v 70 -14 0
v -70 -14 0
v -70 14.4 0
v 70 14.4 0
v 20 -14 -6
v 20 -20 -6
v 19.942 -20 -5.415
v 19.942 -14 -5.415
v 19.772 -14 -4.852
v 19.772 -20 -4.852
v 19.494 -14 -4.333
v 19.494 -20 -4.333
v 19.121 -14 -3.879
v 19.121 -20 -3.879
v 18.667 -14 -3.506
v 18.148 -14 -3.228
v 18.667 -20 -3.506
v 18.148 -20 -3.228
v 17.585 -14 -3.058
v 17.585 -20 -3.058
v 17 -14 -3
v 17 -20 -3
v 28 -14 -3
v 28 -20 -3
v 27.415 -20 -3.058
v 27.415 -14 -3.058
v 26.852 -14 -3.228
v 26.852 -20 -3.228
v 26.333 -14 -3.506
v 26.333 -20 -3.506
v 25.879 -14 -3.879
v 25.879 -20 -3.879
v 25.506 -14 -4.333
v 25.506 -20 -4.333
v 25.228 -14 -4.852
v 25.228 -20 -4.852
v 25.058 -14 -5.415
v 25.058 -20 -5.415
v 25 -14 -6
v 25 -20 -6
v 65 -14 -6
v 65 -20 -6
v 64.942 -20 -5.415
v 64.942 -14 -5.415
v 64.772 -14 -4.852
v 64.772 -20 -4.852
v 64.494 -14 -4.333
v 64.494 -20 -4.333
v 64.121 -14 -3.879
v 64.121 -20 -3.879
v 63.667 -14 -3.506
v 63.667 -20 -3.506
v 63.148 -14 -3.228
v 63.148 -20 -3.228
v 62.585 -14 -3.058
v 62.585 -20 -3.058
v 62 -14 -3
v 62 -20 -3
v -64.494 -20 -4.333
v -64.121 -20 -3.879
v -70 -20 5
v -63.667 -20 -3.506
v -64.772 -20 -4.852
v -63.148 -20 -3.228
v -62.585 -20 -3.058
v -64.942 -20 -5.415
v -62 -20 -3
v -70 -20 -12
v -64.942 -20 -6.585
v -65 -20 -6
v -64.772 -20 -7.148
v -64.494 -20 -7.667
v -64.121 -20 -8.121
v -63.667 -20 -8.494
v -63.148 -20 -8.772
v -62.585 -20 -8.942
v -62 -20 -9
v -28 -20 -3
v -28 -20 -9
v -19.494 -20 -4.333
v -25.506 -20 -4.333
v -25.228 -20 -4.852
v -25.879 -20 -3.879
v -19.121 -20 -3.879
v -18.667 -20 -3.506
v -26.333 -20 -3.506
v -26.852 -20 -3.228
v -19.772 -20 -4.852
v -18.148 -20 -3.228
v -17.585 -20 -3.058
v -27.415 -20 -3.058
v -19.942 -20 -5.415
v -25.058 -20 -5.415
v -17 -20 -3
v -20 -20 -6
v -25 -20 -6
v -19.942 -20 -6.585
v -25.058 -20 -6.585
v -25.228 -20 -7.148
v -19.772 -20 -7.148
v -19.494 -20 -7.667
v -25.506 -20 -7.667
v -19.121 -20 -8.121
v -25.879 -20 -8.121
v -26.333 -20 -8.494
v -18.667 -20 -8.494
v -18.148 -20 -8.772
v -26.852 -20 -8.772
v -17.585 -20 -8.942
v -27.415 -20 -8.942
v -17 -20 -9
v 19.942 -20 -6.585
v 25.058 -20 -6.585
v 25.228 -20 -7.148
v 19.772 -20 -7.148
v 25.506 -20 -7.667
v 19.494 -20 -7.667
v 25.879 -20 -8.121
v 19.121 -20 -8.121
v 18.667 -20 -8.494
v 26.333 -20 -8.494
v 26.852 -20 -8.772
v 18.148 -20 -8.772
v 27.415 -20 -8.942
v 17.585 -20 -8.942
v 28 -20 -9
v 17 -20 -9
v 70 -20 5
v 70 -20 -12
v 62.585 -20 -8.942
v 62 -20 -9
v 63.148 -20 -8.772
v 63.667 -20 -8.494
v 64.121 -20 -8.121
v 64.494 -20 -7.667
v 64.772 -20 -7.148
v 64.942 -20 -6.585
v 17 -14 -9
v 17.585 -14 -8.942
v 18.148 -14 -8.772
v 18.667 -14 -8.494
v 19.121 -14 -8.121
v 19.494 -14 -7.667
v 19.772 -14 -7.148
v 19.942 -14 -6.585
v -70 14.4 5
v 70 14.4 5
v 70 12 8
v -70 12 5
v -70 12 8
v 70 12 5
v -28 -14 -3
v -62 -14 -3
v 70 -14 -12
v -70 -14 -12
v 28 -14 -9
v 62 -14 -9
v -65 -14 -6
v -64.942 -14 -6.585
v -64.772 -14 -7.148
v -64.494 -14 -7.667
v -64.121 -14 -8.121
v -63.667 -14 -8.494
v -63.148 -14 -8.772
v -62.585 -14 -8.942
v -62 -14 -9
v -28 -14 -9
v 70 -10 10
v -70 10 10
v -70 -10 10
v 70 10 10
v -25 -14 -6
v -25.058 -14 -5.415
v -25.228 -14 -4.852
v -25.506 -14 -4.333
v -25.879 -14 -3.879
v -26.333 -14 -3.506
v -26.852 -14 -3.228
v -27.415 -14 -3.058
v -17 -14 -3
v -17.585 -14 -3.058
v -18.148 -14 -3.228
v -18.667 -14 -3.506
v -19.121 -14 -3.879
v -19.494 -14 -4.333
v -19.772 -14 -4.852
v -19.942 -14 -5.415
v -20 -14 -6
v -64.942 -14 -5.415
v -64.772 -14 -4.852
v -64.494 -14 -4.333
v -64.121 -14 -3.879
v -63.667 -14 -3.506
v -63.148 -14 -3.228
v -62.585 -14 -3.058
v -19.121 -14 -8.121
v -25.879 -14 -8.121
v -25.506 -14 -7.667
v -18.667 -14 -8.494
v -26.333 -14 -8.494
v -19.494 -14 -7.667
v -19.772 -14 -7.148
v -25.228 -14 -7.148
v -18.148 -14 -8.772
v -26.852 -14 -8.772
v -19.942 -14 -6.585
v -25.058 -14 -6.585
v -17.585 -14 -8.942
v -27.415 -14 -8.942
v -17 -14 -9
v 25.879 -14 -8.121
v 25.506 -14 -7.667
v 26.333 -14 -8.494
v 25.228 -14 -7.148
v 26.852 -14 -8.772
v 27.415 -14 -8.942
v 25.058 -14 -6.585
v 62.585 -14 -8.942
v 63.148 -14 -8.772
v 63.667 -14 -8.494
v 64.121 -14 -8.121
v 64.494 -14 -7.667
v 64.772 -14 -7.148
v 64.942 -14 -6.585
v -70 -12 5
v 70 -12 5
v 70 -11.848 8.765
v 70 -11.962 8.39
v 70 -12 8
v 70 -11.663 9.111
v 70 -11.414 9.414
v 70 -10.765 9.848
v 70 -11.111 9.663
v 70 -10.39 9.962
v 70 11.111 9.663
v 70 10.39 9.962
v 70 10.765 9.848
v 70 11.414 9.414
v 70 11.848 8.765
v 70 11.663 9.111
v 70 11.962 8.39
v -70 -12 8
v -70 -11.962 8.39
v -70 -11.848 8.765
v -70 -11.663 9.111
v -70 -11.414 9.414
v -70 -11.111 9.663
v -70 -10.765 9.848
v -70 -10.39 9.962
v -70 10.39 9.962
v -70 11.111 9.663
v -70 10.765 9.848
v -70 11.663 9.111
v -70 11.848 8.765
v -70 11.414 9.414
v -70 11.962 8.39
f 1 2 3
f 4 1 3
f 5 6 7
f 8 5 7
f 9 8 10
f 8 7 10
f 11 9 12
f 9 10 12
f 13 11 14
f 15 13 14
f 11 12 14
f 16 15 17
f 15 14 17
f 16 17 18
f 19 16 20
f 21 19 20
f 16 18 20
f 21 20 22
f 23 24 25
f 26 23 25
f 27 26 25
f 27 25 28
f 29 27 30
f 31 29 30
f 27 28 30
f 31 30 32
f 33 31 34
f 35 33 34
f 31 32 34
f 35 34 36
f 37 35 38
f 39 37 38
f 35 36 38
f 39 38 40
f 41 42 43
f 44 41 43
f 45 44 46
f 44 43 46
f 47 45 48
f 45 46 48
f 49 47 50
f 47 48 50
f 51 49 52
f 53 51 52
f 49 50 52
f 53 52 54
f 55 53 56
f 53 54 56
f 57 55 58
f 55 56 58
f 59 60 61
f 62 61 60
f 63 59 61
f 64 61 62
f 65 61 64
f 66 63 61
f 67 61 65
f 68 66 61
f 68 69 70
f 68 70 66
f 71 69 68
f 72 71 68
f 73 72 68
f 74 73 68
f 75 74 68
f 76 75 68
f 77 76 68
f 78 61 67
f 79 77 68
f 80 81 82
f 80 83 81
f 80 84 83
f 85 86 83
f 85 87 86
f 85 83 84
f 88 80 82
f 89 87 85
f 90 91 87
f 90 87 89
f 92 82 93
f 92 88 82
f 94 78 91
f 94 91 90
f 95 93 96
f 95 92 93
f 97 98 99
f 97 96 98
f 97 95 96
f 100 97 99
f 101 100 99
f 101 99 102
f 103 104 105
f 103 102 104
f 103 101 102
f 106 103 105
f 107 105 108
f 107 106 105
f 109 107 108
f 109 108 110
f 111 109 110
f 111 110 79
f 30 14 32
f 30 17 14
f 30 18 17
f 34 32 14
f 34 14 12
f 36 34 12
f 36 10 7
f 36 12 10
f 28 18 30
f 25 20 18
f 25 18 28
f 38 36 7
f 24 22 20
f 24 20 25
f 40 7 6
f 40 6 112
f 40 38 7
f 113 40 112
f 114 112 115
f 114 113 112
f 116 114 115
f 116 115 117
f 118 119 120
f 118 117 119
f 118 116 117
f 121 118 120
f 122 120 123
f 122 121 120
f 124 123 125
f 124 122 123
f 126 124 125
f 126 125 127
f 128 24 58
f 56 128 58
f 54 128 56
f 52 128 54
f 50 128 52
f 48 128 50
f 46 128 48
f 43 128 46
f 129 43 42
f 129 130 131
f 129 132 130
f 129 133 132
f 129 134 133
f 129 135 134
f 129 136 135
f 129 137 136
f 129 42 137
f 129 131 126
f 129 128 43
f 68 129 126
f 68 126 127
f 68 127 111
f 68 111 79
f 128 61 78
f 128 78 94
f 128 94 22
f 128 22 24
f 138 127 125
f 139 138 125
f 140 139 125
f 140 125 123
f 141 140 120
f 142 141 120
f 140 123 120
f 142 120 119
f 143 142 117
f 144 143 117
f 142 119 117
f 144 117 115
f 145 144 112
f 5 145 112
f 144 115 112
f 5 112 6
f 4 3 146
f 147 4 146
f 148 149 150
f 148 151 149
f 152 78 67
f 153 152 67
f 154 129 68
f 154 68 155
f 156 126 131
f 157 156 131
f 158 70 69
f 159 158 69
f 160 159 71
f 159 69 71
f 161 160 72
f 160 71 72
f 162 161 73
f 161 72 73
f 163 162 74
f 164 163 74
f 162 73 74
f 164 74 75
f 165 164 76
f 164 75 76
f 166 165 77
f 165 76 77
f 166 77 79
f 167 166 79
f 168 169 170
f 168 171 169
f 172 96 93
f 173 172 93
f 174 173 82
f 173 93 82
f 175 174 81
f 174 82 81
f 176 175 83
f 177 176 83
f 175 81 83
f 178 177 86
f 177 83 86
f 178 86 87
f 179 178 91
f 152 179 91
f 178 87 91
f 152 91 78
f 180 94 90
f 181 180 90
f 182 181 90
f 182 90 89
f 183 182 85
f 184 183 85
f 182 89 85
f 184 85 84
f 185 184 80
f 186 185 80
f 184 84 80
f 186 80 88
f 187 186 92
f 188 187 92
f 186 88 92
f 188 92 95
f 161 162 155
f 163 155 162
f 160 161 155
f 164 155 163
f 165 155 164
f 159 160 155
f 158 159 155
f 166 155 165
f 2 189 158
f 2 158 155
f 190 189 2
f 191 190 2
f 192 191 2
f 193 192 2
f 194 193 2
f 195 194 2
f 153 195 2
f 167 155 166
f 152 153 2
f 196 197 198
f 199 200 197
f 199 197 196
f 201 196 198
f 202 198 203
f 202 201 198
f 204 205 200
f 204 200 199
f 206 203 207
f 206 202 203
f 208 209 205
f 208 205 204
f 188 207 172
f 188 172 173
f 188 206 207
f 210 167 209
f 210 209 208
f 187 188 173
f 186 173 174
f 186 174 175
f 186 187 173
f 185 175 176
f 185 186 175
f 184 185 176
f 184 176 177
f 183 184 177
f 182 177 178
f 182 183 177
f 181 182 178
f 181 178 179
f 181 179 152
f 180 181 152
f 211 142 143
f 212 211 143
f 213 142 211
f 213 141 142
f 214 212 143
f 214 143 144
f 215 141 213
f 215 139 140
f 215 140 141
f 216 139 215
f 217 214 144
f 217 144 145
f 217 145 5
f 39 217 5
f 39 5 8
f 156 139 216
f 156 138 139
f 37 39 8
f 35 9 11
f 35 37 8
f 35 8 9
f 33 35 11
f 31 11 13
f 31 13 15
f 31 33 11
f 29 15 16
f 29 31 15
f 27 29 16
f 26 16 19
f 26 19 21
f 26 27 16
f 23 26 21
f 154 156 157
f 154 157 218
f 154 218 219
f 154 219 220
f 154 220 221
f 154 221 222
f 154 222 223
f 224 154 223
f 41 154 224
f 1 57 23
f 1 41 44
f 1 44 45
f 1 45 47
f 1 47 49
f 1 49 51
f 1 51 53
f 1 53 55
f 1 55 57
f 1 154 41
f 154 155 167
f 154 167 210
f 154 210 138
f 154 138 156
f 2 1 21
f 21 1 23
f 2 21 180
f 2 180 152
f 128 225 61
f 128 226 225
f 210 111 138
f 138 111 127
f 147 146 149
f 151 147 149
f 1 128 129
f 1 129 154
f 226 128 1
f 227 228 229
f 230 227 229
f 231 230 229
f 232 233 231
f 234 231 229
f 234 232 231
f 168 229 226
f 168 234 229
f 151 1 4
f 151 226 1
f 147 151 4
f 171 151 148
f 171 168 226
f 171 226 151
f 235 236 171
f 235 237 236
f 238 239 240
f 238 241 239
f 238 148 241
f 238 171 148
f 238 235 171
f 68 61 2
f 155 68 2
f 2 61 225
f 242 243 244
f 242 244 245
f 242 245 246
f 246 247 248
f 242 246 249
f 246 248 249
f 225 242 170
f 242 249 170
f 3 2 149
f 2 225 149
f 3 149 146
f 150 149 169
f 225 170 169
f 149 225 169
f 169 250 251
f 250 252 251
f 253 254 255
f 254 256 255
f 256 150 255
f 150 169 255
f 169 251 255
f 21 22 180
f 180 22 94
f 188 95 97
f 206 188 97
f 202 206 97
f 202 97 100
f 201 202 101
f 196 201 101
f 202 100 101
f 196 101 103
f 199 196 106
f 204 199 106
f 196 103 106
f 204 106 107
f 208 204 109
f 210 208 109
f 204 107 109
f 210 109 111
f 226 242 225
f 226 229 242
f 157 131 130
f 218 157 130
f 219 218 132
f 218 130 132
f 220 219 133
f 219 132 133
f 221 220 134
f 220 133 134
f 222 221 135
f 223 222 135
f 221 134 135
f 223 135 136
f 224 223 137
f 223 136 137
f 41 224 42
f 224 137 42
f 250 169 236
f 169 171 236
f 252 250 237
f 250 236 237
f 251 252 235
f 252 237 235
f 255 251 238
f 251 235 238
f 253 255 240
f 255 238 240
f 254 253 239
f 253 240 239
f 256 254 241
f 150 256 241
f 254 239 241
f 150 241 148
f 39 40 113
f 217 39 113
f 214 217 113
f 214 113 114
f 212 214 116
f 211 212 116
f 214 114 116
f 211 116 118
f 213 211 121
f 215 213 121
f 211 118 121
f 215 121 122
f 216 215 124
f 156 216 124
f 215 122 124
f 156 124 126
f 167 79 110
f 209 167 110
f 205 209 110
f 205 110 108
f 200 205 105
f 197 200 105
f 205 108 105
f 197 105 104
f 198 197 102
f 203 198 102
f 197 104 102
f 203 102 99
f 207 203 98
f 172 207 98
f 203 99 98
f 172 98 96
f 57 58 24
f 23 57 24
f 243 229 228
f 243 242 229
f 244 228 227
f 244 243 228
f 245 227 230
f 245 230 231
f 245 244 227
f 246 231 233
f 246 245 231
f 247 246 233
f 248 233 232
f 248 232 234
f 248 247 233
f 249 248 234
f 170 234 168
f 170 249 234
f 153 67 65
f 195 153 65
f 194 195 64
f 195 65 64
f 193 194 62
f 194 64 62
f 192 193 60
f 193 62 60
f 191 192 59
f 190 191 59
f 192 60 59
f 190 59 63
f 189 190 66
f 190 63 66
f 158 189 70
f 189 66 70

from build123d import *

# Parameters (mm, degrees)
F1_DEPTH = 70
F2_R     = 2
F4_DEPTH = 25


with BuildPart() as f1:
    # F0 (on Right) → F1 (new body, symmetric)
    with BuildSketch(Plane.YZ):
        Polygon((-20, 5), (-20, -12), (-14, -12), (-14, 0), (14.4, 0), (14.4, 5), (12, 5), (12, 10), (-12, 10), (-12, 5), align=None)
    extrude(amount=F1_DEPTH, both=True)

    # F2
    f2_edges = [f1.edges().sort_by_distance(p)[0] for p in [
        (0, -12, 10),
        (0, 12, 10),
    ]]
    fillet(f2_edges, radius=F2_R)

    # F3 (on face) → F4 (cut)
    with BuildSketch(Plane.XZ.offset(20)):
        with BuildLine():
            Line((-28, -3), (-62, -3))
            ThreePointArc((-62, -3), (-64.12132, -3.87868), (-65, -6))
            ThreePointArc((-65, -6), (-64.12132, -8.12132), (-62, -9))
            Line((-62, -9), (-28, -9))
            ThreePointArc((-28, -9), (-25.87868, -8.12132), (-25, -6))
            ThreePointArc((-25, -6), (-25.87868, -3.87868), (-28, -3))
        make_face()
        with BuildLine():
            Line((17, -3), (-17, -3))
            ThreePointArc((-17, -3), (-19.12132, -3.87868), (-20, -6))
            ThreePointArc((-20, -6), (-19.12132, -8.12132), (-17, -9))
            Line((-17, -9), (17, -9))
            ThreePointArc((17, -9), (19.12132, -8.12132), (20, -6))
            ThreePointArc((20, -6), (19.12132, -3.87868), (17, -3))
        make_face()
        with BuildLine():
            Line((62, -3), (28, -3))
            ThreePointArc((28, -3), (25.87868, -3.87868), (25, -6))
            ThreePointArc((25, -6), (25.87868, -8.12132), (28, -9))
            Line((28, -9), (62, -9))
            ThreePointArc((62, -9), (64.12132, -8.12132), (65, -6))
            ThreePointArc((65, -6), (64.12132, -3.87868), (62, -3))
        make_face()
    extrude(amount=-F4_DEPTH, mode=Mode.SUBTRACT)


solid = f1.part
